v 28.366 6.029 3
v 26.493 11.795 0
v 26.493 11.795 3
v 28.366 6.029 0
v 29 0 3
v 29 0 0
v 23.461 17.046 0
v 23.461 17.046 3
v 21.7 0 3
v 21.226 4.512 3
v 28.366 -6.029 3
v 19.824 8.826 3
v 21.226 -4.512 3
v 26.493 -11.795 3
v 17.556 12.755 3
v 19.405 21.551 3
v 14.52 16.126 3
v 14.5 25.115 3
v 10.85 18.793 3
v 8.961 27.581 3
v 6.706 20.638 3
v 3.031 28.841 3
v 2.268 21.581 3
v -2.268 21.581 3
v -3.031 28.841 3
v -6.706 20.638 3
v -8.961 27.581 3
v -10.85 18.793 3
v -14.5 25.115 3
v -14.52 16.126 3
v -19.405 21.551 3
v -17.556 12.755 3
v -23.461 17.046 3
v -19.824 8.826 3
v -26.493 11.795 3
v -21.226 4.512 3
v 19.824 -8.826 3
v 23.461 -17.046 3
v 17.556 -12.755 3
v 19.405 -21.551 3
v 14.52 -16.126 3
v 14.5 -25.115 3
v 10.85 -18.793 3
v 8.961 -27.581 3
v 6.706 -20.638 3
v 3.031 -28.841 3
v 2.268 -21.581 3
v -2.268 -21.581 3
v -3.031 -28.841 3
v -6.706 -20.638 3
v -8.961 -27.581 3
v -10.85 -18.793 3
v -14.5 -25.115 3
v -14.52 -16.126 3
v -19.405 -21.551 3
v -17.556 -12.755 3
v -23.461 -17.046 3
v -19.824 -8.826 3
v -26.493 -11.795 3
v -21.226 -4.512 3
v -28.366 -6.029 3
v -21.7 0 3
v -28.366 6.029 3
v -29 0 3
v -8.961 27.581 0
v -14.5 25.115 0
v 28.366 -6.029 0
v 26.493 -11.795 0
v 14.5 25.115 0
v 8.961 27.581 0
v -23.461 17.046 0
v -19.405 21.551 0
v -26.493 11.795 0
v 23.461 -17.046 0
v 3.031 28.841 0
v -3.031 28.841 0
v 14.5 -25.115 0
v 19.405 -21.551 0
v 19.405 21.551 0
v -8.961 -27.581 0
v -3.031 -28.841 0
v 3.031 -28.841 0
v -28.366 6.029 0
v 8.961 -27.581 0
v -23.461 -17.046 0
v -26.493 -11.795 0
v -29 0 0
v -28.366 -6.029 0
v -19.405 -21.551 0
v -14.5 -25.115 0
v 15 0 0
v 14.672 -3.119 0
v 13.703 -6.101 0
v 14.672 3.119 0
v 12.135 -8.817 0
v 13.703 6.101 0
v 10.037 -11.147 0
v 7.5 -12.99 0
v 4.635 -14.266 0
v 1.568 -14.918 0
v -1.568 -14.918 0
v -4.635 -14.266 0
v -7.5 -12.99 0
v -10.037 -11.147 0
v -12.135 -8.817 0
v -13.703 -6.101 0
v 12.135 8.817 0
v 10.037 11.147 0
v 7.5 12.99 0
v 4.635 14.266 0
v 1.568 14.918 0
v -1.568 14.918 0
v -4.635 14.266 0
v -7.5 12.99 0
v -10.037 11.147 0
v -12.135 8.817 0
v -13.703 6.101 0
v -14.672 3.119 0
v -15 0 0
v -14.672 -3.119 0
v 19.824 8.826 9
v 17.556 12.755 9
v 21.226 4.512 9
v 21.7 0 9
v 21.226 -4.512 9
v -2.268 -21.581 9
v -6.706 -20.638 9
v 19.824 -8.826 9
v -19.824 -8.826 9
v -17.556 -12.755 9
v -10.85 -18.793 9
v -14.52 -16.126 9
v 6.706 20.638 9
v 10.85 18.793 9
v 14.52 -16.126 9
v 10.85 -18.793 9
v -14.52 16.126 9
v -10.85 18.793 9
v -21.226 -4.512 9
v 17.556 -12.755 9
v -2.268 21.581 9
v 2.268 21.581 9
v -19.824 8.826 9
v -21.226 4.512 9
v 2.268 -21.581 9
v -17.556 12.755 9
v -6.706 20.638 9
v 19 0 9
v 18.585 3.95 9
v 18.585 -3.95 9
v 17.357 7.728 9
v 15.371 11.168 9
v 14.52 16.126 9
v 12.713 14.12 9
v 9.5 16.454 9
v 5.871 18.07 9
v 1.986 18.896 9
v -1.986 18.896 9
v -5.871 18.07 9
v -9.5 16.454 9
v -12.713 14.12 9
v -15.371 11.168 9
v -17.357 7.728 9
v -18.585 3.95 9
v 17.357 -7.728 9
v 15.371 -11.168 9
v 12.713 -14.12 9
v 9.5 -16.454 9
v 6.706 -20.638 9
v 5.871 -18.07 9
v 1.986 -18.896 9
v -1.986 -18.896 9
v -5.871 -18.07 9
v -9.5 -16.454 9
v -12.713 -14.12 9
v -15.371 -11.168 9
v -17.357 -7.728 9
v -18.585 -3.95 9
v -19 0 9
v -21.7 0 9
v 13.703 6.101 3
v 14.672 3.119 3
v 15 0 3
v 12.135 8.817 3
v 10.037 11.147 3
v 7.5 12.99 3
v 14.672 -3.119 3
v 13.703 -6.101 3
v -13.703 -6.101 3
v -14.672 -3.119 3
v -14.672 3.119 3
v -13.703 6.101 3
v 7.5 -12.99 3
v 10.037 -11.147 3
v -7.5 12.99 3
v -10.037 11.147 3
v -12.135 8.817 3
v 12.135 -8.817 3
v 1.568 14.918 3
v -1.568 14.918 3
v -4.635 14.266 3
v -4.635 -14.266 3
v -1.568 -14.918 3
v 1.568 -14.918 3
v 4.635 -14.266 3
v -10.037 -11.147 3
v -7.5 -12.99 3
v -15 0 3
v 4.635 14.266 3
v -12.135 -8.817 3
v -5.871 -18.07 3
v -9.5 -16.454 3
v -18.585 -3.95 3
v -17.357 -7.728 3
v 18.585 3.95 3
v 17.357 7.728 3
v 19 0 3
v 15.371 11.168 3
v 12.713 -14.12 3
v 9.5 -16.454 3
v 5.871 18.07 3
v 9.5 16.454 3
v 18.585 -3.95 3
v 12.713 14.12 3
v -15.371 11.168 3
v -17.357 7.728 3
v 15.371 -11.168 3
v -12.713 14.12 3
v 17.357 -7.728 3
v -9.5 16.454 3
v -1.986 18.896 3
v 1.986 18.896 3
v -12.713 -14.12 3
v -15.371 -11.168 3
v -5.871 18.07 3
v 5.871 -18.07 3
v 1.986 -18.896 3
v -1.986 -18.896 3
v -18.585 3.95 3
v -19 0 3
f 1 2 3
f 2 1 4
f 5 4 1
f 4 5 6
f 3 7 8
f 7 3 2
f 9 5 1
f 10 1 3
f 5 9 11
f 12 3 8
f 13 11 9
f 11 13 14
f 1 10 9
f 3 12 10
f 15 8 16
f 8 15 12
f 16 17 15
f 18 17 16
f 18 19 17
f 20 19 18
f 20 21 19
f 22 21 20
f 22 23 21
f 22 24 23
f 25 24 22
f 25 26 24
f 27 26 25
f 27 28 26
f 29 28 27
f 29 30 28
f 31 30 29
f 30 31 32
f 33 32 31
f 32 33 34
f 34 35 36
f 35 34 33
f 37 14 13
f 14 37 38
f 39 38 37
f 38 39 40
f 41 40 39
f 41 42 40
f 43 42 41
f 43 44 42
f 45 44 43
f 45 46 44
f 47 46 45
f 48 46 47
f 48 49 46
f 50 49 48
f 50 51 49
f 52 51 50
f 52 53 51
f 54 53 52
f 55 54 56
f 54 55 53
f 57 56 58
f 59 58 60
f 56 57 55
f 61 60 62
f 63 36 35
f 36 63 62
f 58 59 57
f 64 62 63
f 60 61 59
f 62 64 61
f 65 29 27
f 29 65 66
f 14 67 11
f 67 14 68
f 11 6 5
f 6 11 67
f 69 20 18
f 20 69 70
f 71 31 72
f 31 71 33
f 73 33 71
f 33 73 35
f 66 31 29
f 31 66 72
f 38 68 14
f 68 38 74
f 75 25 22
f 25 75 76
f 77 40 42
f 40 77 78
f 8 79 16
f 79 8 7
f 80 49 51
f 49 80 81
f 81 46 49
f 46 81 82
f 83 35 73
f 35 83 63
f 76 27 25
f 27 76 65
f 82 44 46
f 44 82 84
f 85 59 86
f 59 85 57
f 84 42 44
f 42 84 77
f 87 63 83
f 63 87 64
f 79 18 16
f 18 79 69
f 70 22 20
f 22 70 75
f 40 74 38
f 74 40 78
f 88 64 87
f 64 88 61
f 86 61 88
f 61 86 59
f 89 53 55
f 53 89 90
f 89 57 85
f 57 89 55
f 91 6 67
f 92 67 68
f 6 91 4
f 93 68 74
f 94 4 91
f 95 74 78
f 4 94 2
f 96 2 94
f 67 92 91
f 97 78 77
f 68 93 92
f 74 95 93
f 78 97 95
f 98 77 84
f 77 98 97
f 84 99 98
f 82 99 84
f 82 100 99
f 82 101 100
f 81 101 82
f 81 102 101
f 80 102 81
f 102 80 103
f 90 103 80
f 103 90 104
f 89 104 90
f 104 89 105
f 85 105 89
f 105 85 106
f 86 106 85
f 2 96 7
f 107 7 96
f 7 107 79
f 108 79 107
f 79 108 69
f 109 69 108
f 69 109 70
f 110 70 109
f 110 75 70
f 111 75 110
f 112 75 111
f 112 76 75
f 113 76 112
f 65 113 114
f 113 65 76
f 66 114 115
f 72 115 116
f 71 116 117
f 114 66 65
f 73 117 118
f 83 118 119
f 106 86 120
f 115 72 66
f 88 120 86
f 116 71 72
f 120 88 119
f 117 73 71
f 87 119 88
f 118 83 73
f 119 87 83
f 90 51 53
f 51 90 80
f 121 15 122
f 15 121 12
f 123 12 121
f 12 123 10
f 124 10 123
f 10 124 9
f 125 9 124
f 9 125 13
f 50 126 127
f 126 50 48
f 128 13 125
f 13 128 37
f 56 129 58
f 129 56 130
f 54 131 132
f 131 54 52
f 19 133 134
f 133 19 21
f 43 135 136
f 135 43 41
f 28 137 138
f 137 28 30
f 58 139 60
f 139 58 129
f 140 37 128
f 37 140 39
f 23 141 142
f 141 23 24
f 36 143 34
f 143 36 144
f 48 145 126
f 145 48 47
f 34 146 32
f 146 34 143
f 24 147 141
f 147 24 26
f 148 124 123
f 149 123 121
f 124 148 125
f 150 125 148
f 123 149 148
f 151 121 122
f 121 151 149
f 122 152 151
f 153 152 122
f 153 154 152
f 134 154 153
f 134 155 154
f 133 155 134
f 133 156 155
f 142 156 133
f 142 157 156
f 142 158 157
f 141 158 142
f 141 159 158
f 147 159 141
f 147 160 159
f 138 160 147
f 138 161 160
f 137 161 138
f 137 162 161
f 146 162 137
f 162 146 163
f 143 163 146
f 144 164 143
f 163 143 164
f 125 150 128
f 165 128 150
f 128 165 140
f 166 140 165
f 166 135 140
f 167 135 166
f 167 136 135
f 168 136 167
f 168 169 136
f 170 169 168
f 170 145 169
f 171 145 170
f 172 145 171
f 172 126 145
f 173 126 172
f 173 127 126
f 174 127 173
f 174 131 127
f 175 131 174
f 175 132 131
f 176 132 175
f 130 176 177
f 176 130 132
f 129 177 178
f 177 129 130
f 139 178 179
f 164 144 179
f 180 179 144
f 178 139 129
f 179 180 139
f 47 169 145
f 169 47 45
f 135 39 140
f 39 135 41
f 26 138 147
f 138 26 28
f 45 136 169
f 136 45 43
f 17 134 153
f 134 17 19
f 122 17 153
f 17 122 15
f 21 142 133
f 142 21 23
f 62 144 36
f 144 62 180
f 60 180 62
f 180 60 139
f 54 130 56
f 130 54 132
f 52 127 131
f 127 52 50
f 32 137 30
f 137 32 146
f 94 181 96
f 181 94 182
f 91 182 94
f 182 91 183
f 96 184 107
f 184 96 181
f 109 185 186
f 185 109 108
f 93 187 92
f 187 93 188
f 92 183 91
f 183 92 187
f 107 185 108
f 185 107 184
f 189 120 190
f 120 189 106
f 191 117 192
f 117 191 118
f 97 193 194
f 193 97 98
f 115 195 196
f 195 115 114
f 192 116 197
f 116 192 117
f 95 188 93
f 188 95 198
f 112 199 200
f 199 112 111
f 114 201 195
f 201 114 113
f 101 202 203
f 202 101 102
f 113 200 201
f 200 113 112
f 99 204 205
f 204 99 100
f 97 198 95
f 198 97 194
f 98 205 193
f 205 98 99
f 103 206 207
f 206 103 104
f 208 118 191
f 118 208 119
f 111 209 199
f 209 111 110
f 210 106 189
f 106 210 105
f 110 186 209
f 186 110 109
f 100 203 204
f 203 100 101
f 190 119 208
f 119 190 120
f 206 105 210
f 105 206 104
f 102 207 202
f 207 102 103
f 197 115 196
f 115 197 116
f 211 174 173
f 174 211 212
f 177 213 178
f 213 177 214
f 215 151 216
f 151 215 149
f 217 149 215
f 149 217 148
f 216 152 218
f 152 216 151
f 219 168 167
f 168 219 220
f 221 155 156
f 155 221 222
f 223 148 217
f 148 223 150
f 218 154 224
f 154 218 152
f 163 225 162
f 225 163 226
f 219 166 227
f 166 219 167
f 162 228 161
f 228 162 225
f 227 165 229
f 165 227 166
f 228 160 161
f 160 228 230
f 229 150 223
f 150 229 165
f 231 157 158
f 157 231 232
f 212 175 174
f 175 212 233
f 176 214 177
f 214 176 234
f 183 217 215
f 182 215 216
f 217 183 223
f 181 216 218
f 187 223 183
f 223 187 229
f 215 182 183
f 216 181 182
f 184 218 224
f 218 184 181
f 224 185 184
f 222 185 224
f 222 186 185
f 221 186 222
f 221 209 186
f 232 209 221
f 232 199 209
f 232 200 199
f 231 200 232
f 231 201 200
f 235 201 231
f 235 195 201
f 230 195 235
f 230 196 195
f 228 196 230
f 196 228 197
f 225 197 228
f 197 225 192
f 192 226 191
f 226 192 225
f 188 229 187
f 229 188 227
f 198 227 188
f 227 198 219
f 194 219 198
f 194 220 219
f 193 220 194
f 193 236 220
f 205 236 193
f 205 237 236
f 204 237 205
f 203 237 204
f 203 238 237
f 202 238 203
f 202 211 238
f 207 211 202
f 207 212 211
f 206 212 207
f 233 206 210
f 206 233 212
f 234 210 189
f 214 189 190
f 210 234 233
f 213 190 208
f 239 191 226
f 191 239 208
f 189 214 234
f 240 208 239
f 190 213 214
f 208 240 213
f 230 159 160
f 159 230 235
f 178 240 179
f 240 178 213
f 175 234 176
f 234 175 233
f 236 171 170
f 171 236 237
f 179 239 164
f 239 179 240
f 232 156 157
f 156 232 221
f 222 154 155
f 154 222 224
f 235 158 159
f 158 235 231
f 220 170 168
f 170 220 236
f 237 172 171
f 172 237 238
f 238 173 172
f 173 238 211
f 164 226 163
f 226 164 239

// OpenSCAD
// [FL_INDEX: keywords="openscad, 3d_parametric, Lamp_Shade_Reducer_Ring, csg_solid" | COT="Parametric OpenSCAD design from 3DCodeverse"]
// Title: Lamp Shade Reducer Ring

difference() {

union() {

	cylinder(3,29,29);
	cylinder(9,21.7,21.7);

}

	#cylinder(20,15,15);
	translate([0,0,3])
	#cylinder(20,19,19);
}
